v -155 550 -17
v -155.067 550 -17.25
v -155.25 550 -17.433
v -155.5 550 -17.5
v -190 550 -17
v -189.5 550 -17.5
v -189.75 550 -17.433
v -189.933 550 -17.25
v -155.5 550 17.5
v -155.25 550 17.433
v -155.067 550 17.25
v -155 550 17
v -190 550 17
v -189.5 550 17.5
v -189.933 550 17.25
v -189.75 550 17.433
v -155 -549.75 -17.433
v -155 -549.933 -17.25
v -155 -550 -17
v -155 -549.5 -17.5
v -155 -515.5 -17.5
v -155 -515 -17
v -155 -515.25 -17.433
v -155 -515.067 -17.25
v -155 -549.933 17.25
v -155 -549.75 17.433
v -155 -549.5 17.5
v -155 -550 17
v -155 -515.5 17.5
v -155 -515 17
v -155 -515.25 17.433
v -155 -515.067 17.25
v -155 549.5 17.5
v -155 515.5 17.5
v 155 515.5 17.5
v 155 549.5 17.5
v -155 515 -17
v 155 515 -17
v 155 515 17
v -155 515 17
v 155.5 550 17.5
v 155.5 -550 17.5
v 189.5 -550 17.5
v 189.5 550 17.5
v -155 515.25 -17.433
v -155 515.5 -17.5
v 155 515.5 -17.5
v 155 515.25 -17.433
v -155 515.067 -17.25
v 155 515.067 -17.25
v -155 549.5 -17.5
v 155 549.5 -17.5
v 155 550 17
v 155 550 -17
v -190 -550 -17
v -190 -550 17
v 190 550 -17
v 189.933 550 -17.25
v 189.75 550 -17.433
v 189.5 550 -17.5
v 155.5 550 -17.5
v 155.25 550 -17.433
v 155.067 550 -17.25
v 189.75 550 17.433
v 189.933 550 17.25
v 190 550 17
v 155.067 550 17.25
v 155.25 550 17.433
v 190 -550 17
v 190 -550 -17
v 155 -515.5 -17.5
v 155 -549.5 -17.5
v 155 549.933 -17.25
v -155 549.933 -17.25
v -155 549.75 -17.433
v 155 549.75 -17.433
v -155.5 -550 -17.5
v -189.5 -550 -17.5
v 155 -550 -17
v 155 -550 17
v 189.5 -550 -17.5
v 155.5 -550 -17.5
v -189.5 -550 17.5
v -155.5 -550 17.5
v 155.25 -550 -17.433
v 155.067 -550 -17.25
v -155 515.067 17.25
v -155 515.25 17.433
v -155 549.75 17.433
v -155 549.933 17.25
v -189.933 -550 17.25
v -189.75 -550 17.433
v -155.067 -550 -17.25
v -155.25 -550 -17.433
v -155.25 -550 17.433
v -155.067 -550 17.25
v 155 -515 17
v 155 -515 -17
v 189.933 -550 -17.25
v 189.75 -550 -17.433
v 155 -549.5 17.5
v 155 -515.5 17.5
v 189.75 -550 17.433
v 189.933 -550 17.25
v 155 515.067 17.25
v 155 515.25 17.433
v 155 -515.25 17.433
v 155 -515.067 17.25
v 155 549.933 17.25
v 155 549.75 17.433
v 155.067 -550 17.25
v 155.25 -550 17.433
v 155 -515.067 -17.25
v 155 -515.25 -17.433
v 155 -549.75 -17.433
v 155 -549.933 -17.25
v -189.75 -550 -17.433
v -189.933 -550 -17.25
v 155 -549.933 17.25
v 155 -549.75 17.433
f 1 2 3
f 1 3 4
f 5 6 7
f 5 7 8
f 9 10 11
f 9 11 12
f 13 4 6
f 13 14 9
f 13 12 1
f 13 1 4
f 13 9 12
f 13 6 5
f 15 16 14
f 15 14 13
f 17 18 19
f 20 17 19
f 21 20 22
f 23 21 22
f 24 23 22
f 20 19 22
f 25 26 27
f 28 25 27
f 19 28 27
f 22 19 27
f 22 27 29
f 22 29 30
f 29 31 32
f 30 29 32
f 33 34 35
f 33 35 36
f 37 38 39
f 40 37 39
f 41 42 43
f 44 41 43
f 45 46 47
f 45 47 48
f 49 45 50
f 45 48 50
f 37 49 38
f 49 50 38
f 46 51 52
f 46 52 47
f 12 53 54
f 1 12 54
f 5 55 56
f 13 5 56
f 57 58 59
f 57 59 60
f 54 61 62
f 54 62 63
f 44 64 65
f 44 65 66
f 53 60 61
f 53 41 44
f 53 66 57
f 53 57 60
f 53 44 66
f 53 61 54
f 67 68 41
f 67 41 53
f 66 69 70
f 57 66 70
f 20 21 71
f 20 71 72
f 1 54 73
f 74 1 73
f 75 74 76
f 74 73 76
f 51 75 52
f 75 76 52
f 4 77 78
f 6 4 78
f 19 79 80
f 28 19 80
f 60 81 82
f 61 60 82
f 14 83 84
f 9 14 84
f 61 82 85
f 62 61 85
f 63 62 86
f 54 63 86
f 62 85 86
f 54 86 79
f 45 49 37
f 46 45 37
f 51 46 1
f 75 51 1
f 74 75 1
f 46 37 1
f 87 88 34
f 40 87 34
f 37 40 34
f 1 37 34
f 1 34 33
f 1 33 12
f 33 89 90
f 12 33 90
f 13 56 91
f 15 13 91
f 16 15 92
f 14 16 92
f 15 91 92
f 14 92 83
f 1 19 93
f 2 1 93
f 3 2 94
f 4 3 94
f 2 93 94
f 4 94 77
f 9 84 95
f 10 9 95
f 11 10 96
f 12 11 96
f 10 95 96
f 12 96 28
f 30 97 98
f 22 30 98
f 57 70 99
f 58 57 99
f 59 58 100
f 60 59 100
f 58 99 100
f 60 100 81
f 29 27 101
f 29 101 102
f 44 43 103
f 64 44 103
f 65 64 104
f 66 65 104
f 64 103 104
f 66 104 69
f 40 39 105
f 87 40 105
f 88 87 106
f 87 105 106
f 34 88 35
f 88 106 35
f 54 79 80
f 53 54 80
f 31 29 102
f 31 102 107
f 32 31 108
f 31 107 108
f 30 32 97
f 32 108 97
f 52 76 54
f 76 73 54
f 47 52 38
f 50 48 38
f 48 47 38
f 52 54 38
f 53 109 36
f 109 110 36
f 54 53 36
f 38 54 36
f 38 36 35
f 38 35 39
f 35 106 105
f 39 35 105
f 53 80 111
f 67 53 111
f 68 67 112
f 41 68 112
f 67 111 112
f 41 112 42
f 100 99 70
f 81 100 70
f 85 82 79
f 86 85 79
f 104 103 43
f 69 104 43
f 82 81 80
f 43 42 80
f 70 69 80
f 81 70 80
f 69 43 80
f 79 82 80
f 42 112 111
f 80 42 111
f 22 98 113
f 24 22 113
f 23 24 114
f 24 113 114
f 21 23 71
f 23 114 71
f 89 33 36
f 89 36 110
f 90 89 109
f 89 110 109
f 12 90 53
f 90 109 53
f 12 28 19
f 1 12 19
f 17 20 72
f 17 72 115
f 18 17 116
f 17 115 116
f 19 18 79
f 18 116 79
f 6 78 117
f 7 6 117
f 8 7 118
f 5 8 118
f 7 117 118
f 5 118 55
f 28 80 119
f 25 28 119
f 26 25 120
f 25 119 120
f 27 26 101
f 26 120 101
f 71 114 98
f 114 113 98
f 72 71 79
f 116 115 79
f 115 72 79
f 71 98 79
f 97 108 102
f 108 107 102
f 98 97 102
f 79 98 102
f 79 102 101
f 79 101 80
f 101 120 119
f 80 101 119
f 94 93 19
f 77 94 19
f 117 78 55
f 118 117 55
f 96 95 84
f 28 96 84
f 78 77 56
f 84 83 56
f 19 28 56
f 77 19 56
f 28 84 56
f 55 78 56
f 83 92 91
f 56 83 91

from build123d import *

# Parameters (mm, degrees)
CUSTOM_TASSEAU_CARRE_33_1_DEPTH      = 1082.5
CUSTOM_TASSEAU_CARRE_33_1_DEPTH_BACK = 17.5
CUSTOM_TASSEAU_CARRE_33_1_2_DEPTH    = 1100
CUSTOM_TASSEAU_CARRE_33_1_3_DEPTH    = 347
CUSTOM_TASSEAU_CARRE_33_1_4_DEPTH    = 347


with BuildPart() as part:
    # Esquisse14 → Custom TASSEAU-CARRE-33(1) (new, two sides: drawn at the far end of the back side and taken through both)
    with BuildSketch(Plane(origin=(172.5, -532.5, 0), x_dir=(-1, 0, 0), z_dir=(0, 1, 0)).offset(-CUSTOM_TASSEAU_CARRE_33_1_DEPTH_BACK)):
        with BuildLine():
            Line((-17, -17.5), (17, -17.5))
            ThreePointArc((17, -17.5), (17.353553391, -17.353553391), (17.5, -17))
            Line((17.5, -17), (17.5, 17))
            ThreePointArc((17.5, 17), (17.353553391, 17.353553391), (17, 17.5))
            Line((17, 17.5), (-17, 17.5))
            ThreePointArc((-17, 17.5), (-17.353553391, 17.353553391), (-17.5, 17))
            Line((-17.5, 17), (-17.5, -17))
            ThreePointArc((-17.5, -17), (-17.353553391, -17.353553391), (-17, -17.5))
        make_face()
    extrude(amount=CUSTOM_TASSEAU_CARRE_33_1_DEPTH + CUSTOM_TASSEAU_CARRE_33_1_DEPTH_BACK)


with BuildPart() as body_2:
    # Esquisse14 on segment 2 (carried to segment 2) → Custom TASSEAU-CARRE-33_1 2 (new body)
    with BuildSketch(Plane(origin=(-172.5, -550, 0), x_dir=(-1, 0, 0), z_dir=(0, 1, 0))):
        with BuildLine():
            Line((-17, -17.5), (17, -17.5))
            ThreePointArc((17, -17.5), (17.353553391, -17.353553391), (17.5, -17))
            Line((17.5, -17), (17.5, 17))
            ThreePointArc((17.5, 17), (17.353553391, 17.353553391), (17, 17.5))
            Line((17, 17.5), (-17, 17.5))
            ThreePointArc((-17, 17.5), (-17.353553391, 17.353553391), (-17.5, 17))
            Line((-17.5, 17), (-17.5, -17))
            ThreePointArc((-17.5, -17), (-17.353553391, -17.353553391), (-17, -17.5))
        make_face()
    extrude(amount=CUSTOM_TASSEAU_CARRE_33_1_2_DEPTH)


with BuildPart() as body_3:
    # Esquisse14 on segment 3 (carried to segment 3) → Custom TASSEAU-CARRE-33_1 3 (new body)
    with BuildSketch(Plane(origin=(173.5, 532.5, 0), x_dir=(0, -1, 0), z_dir=(-1, 0, 0))):
        with BuildLine():
            Line((-17, -17.5), (17, -17.5))
            ThreePointArc((17, -17.5), (17.353553391, -17.353553391), (17.5, -17))
            Line((17.5, -17), (17.5, 17))
            ThreePointArc((17.5, 17), (17.353553391, 17.353553391), (17, 17.5))
            Line((17, 17.5), (-17, 17.5))
            ThreePointArc((-17, 17.5), (-17.353553391, 17.353553391), (-17.5, 17))
            Line((-17.5, 17), (-17.5, -17))
            ThreePointArc((-17.5, -17), (-17.353553391, -17.353553391), (-17, -17.5))
        make_face()
    extrude(amount=CUSTOM_TASSEAU_CARRE_33_1_3_DEPTH)

    # Custom TASSEAU-CARRE-33_1 3 end butt 1
    split(bisect_by=Plane(origin=(155, 532.5, 0), x_dir=(0, -1, 0), z_dir=(-1, 0, 0)), keep=Keep.TOP)

    # Custom TASSEAU-CARRE-33_1 3 end butt 2
    split(bisect_by=Plane(origin=(-155, 532.5, 0), x_dir=(0, 1, 0), z_dir=(1, 0, 0)), keep=Keep.TOP)


with BuildPart() as body_4:
    # Esquisse14 on segment 4 (carried to segment 4) → Custom TASSEAU-CARRE-33_1 4 (new body)
    with BuildSketch(Plane(origin=(173.5, -532.5, 0), x_dir=(0, -1, 0), z_dir=(-1, 0, 0))):
        with BuildLine():
            Line((-17, -17.5), (17, -17.5))
            ThreePointArc((17, -17.5), (17.353553391, -17.353553391), (17.5, -17))
            Line((17.5, -17), (17.5, 17))
            ThreePointArc((17.5, 17), (17.353553391, 17.353553391), (17, 17.5))
            Line((17, 17.5), (-17, 17.5))
            ThreePointArc((-17, 17.5), (-17.353553391, 17.353553391), (-17.5, 17))
            Line((-17.5, 17), (-17.5, -17))
            ThreePointArc((-17.5, -17), (-17.353553391, -17.353553391), (-17, -17.5))
        make_face()
    extrude(amount=CUSTOM_TASSEAU_CARRE_33_1_4_DEPTH)

    # Custom TASSEAU-CARRE-33_1 4 end butt 1
    split(bisect_by=Plane(origin=(155, -532.5, 0), x_dir=(0, -1, 0), z_dir=(-1, 0, 0)), keep=Keep.TOP)

    # Custom TASSEAU-CARRE-33_1 4 end butt 2
    split(bisect_by=Plane(origin=(-155, -532.5, 0), x_dir=(0, 1, 0), z_dir=(1, 0, 0)), keep=Keep.TOP)


solid = Compound([part.part, body_2.part, body_3.part, body_4.part])
